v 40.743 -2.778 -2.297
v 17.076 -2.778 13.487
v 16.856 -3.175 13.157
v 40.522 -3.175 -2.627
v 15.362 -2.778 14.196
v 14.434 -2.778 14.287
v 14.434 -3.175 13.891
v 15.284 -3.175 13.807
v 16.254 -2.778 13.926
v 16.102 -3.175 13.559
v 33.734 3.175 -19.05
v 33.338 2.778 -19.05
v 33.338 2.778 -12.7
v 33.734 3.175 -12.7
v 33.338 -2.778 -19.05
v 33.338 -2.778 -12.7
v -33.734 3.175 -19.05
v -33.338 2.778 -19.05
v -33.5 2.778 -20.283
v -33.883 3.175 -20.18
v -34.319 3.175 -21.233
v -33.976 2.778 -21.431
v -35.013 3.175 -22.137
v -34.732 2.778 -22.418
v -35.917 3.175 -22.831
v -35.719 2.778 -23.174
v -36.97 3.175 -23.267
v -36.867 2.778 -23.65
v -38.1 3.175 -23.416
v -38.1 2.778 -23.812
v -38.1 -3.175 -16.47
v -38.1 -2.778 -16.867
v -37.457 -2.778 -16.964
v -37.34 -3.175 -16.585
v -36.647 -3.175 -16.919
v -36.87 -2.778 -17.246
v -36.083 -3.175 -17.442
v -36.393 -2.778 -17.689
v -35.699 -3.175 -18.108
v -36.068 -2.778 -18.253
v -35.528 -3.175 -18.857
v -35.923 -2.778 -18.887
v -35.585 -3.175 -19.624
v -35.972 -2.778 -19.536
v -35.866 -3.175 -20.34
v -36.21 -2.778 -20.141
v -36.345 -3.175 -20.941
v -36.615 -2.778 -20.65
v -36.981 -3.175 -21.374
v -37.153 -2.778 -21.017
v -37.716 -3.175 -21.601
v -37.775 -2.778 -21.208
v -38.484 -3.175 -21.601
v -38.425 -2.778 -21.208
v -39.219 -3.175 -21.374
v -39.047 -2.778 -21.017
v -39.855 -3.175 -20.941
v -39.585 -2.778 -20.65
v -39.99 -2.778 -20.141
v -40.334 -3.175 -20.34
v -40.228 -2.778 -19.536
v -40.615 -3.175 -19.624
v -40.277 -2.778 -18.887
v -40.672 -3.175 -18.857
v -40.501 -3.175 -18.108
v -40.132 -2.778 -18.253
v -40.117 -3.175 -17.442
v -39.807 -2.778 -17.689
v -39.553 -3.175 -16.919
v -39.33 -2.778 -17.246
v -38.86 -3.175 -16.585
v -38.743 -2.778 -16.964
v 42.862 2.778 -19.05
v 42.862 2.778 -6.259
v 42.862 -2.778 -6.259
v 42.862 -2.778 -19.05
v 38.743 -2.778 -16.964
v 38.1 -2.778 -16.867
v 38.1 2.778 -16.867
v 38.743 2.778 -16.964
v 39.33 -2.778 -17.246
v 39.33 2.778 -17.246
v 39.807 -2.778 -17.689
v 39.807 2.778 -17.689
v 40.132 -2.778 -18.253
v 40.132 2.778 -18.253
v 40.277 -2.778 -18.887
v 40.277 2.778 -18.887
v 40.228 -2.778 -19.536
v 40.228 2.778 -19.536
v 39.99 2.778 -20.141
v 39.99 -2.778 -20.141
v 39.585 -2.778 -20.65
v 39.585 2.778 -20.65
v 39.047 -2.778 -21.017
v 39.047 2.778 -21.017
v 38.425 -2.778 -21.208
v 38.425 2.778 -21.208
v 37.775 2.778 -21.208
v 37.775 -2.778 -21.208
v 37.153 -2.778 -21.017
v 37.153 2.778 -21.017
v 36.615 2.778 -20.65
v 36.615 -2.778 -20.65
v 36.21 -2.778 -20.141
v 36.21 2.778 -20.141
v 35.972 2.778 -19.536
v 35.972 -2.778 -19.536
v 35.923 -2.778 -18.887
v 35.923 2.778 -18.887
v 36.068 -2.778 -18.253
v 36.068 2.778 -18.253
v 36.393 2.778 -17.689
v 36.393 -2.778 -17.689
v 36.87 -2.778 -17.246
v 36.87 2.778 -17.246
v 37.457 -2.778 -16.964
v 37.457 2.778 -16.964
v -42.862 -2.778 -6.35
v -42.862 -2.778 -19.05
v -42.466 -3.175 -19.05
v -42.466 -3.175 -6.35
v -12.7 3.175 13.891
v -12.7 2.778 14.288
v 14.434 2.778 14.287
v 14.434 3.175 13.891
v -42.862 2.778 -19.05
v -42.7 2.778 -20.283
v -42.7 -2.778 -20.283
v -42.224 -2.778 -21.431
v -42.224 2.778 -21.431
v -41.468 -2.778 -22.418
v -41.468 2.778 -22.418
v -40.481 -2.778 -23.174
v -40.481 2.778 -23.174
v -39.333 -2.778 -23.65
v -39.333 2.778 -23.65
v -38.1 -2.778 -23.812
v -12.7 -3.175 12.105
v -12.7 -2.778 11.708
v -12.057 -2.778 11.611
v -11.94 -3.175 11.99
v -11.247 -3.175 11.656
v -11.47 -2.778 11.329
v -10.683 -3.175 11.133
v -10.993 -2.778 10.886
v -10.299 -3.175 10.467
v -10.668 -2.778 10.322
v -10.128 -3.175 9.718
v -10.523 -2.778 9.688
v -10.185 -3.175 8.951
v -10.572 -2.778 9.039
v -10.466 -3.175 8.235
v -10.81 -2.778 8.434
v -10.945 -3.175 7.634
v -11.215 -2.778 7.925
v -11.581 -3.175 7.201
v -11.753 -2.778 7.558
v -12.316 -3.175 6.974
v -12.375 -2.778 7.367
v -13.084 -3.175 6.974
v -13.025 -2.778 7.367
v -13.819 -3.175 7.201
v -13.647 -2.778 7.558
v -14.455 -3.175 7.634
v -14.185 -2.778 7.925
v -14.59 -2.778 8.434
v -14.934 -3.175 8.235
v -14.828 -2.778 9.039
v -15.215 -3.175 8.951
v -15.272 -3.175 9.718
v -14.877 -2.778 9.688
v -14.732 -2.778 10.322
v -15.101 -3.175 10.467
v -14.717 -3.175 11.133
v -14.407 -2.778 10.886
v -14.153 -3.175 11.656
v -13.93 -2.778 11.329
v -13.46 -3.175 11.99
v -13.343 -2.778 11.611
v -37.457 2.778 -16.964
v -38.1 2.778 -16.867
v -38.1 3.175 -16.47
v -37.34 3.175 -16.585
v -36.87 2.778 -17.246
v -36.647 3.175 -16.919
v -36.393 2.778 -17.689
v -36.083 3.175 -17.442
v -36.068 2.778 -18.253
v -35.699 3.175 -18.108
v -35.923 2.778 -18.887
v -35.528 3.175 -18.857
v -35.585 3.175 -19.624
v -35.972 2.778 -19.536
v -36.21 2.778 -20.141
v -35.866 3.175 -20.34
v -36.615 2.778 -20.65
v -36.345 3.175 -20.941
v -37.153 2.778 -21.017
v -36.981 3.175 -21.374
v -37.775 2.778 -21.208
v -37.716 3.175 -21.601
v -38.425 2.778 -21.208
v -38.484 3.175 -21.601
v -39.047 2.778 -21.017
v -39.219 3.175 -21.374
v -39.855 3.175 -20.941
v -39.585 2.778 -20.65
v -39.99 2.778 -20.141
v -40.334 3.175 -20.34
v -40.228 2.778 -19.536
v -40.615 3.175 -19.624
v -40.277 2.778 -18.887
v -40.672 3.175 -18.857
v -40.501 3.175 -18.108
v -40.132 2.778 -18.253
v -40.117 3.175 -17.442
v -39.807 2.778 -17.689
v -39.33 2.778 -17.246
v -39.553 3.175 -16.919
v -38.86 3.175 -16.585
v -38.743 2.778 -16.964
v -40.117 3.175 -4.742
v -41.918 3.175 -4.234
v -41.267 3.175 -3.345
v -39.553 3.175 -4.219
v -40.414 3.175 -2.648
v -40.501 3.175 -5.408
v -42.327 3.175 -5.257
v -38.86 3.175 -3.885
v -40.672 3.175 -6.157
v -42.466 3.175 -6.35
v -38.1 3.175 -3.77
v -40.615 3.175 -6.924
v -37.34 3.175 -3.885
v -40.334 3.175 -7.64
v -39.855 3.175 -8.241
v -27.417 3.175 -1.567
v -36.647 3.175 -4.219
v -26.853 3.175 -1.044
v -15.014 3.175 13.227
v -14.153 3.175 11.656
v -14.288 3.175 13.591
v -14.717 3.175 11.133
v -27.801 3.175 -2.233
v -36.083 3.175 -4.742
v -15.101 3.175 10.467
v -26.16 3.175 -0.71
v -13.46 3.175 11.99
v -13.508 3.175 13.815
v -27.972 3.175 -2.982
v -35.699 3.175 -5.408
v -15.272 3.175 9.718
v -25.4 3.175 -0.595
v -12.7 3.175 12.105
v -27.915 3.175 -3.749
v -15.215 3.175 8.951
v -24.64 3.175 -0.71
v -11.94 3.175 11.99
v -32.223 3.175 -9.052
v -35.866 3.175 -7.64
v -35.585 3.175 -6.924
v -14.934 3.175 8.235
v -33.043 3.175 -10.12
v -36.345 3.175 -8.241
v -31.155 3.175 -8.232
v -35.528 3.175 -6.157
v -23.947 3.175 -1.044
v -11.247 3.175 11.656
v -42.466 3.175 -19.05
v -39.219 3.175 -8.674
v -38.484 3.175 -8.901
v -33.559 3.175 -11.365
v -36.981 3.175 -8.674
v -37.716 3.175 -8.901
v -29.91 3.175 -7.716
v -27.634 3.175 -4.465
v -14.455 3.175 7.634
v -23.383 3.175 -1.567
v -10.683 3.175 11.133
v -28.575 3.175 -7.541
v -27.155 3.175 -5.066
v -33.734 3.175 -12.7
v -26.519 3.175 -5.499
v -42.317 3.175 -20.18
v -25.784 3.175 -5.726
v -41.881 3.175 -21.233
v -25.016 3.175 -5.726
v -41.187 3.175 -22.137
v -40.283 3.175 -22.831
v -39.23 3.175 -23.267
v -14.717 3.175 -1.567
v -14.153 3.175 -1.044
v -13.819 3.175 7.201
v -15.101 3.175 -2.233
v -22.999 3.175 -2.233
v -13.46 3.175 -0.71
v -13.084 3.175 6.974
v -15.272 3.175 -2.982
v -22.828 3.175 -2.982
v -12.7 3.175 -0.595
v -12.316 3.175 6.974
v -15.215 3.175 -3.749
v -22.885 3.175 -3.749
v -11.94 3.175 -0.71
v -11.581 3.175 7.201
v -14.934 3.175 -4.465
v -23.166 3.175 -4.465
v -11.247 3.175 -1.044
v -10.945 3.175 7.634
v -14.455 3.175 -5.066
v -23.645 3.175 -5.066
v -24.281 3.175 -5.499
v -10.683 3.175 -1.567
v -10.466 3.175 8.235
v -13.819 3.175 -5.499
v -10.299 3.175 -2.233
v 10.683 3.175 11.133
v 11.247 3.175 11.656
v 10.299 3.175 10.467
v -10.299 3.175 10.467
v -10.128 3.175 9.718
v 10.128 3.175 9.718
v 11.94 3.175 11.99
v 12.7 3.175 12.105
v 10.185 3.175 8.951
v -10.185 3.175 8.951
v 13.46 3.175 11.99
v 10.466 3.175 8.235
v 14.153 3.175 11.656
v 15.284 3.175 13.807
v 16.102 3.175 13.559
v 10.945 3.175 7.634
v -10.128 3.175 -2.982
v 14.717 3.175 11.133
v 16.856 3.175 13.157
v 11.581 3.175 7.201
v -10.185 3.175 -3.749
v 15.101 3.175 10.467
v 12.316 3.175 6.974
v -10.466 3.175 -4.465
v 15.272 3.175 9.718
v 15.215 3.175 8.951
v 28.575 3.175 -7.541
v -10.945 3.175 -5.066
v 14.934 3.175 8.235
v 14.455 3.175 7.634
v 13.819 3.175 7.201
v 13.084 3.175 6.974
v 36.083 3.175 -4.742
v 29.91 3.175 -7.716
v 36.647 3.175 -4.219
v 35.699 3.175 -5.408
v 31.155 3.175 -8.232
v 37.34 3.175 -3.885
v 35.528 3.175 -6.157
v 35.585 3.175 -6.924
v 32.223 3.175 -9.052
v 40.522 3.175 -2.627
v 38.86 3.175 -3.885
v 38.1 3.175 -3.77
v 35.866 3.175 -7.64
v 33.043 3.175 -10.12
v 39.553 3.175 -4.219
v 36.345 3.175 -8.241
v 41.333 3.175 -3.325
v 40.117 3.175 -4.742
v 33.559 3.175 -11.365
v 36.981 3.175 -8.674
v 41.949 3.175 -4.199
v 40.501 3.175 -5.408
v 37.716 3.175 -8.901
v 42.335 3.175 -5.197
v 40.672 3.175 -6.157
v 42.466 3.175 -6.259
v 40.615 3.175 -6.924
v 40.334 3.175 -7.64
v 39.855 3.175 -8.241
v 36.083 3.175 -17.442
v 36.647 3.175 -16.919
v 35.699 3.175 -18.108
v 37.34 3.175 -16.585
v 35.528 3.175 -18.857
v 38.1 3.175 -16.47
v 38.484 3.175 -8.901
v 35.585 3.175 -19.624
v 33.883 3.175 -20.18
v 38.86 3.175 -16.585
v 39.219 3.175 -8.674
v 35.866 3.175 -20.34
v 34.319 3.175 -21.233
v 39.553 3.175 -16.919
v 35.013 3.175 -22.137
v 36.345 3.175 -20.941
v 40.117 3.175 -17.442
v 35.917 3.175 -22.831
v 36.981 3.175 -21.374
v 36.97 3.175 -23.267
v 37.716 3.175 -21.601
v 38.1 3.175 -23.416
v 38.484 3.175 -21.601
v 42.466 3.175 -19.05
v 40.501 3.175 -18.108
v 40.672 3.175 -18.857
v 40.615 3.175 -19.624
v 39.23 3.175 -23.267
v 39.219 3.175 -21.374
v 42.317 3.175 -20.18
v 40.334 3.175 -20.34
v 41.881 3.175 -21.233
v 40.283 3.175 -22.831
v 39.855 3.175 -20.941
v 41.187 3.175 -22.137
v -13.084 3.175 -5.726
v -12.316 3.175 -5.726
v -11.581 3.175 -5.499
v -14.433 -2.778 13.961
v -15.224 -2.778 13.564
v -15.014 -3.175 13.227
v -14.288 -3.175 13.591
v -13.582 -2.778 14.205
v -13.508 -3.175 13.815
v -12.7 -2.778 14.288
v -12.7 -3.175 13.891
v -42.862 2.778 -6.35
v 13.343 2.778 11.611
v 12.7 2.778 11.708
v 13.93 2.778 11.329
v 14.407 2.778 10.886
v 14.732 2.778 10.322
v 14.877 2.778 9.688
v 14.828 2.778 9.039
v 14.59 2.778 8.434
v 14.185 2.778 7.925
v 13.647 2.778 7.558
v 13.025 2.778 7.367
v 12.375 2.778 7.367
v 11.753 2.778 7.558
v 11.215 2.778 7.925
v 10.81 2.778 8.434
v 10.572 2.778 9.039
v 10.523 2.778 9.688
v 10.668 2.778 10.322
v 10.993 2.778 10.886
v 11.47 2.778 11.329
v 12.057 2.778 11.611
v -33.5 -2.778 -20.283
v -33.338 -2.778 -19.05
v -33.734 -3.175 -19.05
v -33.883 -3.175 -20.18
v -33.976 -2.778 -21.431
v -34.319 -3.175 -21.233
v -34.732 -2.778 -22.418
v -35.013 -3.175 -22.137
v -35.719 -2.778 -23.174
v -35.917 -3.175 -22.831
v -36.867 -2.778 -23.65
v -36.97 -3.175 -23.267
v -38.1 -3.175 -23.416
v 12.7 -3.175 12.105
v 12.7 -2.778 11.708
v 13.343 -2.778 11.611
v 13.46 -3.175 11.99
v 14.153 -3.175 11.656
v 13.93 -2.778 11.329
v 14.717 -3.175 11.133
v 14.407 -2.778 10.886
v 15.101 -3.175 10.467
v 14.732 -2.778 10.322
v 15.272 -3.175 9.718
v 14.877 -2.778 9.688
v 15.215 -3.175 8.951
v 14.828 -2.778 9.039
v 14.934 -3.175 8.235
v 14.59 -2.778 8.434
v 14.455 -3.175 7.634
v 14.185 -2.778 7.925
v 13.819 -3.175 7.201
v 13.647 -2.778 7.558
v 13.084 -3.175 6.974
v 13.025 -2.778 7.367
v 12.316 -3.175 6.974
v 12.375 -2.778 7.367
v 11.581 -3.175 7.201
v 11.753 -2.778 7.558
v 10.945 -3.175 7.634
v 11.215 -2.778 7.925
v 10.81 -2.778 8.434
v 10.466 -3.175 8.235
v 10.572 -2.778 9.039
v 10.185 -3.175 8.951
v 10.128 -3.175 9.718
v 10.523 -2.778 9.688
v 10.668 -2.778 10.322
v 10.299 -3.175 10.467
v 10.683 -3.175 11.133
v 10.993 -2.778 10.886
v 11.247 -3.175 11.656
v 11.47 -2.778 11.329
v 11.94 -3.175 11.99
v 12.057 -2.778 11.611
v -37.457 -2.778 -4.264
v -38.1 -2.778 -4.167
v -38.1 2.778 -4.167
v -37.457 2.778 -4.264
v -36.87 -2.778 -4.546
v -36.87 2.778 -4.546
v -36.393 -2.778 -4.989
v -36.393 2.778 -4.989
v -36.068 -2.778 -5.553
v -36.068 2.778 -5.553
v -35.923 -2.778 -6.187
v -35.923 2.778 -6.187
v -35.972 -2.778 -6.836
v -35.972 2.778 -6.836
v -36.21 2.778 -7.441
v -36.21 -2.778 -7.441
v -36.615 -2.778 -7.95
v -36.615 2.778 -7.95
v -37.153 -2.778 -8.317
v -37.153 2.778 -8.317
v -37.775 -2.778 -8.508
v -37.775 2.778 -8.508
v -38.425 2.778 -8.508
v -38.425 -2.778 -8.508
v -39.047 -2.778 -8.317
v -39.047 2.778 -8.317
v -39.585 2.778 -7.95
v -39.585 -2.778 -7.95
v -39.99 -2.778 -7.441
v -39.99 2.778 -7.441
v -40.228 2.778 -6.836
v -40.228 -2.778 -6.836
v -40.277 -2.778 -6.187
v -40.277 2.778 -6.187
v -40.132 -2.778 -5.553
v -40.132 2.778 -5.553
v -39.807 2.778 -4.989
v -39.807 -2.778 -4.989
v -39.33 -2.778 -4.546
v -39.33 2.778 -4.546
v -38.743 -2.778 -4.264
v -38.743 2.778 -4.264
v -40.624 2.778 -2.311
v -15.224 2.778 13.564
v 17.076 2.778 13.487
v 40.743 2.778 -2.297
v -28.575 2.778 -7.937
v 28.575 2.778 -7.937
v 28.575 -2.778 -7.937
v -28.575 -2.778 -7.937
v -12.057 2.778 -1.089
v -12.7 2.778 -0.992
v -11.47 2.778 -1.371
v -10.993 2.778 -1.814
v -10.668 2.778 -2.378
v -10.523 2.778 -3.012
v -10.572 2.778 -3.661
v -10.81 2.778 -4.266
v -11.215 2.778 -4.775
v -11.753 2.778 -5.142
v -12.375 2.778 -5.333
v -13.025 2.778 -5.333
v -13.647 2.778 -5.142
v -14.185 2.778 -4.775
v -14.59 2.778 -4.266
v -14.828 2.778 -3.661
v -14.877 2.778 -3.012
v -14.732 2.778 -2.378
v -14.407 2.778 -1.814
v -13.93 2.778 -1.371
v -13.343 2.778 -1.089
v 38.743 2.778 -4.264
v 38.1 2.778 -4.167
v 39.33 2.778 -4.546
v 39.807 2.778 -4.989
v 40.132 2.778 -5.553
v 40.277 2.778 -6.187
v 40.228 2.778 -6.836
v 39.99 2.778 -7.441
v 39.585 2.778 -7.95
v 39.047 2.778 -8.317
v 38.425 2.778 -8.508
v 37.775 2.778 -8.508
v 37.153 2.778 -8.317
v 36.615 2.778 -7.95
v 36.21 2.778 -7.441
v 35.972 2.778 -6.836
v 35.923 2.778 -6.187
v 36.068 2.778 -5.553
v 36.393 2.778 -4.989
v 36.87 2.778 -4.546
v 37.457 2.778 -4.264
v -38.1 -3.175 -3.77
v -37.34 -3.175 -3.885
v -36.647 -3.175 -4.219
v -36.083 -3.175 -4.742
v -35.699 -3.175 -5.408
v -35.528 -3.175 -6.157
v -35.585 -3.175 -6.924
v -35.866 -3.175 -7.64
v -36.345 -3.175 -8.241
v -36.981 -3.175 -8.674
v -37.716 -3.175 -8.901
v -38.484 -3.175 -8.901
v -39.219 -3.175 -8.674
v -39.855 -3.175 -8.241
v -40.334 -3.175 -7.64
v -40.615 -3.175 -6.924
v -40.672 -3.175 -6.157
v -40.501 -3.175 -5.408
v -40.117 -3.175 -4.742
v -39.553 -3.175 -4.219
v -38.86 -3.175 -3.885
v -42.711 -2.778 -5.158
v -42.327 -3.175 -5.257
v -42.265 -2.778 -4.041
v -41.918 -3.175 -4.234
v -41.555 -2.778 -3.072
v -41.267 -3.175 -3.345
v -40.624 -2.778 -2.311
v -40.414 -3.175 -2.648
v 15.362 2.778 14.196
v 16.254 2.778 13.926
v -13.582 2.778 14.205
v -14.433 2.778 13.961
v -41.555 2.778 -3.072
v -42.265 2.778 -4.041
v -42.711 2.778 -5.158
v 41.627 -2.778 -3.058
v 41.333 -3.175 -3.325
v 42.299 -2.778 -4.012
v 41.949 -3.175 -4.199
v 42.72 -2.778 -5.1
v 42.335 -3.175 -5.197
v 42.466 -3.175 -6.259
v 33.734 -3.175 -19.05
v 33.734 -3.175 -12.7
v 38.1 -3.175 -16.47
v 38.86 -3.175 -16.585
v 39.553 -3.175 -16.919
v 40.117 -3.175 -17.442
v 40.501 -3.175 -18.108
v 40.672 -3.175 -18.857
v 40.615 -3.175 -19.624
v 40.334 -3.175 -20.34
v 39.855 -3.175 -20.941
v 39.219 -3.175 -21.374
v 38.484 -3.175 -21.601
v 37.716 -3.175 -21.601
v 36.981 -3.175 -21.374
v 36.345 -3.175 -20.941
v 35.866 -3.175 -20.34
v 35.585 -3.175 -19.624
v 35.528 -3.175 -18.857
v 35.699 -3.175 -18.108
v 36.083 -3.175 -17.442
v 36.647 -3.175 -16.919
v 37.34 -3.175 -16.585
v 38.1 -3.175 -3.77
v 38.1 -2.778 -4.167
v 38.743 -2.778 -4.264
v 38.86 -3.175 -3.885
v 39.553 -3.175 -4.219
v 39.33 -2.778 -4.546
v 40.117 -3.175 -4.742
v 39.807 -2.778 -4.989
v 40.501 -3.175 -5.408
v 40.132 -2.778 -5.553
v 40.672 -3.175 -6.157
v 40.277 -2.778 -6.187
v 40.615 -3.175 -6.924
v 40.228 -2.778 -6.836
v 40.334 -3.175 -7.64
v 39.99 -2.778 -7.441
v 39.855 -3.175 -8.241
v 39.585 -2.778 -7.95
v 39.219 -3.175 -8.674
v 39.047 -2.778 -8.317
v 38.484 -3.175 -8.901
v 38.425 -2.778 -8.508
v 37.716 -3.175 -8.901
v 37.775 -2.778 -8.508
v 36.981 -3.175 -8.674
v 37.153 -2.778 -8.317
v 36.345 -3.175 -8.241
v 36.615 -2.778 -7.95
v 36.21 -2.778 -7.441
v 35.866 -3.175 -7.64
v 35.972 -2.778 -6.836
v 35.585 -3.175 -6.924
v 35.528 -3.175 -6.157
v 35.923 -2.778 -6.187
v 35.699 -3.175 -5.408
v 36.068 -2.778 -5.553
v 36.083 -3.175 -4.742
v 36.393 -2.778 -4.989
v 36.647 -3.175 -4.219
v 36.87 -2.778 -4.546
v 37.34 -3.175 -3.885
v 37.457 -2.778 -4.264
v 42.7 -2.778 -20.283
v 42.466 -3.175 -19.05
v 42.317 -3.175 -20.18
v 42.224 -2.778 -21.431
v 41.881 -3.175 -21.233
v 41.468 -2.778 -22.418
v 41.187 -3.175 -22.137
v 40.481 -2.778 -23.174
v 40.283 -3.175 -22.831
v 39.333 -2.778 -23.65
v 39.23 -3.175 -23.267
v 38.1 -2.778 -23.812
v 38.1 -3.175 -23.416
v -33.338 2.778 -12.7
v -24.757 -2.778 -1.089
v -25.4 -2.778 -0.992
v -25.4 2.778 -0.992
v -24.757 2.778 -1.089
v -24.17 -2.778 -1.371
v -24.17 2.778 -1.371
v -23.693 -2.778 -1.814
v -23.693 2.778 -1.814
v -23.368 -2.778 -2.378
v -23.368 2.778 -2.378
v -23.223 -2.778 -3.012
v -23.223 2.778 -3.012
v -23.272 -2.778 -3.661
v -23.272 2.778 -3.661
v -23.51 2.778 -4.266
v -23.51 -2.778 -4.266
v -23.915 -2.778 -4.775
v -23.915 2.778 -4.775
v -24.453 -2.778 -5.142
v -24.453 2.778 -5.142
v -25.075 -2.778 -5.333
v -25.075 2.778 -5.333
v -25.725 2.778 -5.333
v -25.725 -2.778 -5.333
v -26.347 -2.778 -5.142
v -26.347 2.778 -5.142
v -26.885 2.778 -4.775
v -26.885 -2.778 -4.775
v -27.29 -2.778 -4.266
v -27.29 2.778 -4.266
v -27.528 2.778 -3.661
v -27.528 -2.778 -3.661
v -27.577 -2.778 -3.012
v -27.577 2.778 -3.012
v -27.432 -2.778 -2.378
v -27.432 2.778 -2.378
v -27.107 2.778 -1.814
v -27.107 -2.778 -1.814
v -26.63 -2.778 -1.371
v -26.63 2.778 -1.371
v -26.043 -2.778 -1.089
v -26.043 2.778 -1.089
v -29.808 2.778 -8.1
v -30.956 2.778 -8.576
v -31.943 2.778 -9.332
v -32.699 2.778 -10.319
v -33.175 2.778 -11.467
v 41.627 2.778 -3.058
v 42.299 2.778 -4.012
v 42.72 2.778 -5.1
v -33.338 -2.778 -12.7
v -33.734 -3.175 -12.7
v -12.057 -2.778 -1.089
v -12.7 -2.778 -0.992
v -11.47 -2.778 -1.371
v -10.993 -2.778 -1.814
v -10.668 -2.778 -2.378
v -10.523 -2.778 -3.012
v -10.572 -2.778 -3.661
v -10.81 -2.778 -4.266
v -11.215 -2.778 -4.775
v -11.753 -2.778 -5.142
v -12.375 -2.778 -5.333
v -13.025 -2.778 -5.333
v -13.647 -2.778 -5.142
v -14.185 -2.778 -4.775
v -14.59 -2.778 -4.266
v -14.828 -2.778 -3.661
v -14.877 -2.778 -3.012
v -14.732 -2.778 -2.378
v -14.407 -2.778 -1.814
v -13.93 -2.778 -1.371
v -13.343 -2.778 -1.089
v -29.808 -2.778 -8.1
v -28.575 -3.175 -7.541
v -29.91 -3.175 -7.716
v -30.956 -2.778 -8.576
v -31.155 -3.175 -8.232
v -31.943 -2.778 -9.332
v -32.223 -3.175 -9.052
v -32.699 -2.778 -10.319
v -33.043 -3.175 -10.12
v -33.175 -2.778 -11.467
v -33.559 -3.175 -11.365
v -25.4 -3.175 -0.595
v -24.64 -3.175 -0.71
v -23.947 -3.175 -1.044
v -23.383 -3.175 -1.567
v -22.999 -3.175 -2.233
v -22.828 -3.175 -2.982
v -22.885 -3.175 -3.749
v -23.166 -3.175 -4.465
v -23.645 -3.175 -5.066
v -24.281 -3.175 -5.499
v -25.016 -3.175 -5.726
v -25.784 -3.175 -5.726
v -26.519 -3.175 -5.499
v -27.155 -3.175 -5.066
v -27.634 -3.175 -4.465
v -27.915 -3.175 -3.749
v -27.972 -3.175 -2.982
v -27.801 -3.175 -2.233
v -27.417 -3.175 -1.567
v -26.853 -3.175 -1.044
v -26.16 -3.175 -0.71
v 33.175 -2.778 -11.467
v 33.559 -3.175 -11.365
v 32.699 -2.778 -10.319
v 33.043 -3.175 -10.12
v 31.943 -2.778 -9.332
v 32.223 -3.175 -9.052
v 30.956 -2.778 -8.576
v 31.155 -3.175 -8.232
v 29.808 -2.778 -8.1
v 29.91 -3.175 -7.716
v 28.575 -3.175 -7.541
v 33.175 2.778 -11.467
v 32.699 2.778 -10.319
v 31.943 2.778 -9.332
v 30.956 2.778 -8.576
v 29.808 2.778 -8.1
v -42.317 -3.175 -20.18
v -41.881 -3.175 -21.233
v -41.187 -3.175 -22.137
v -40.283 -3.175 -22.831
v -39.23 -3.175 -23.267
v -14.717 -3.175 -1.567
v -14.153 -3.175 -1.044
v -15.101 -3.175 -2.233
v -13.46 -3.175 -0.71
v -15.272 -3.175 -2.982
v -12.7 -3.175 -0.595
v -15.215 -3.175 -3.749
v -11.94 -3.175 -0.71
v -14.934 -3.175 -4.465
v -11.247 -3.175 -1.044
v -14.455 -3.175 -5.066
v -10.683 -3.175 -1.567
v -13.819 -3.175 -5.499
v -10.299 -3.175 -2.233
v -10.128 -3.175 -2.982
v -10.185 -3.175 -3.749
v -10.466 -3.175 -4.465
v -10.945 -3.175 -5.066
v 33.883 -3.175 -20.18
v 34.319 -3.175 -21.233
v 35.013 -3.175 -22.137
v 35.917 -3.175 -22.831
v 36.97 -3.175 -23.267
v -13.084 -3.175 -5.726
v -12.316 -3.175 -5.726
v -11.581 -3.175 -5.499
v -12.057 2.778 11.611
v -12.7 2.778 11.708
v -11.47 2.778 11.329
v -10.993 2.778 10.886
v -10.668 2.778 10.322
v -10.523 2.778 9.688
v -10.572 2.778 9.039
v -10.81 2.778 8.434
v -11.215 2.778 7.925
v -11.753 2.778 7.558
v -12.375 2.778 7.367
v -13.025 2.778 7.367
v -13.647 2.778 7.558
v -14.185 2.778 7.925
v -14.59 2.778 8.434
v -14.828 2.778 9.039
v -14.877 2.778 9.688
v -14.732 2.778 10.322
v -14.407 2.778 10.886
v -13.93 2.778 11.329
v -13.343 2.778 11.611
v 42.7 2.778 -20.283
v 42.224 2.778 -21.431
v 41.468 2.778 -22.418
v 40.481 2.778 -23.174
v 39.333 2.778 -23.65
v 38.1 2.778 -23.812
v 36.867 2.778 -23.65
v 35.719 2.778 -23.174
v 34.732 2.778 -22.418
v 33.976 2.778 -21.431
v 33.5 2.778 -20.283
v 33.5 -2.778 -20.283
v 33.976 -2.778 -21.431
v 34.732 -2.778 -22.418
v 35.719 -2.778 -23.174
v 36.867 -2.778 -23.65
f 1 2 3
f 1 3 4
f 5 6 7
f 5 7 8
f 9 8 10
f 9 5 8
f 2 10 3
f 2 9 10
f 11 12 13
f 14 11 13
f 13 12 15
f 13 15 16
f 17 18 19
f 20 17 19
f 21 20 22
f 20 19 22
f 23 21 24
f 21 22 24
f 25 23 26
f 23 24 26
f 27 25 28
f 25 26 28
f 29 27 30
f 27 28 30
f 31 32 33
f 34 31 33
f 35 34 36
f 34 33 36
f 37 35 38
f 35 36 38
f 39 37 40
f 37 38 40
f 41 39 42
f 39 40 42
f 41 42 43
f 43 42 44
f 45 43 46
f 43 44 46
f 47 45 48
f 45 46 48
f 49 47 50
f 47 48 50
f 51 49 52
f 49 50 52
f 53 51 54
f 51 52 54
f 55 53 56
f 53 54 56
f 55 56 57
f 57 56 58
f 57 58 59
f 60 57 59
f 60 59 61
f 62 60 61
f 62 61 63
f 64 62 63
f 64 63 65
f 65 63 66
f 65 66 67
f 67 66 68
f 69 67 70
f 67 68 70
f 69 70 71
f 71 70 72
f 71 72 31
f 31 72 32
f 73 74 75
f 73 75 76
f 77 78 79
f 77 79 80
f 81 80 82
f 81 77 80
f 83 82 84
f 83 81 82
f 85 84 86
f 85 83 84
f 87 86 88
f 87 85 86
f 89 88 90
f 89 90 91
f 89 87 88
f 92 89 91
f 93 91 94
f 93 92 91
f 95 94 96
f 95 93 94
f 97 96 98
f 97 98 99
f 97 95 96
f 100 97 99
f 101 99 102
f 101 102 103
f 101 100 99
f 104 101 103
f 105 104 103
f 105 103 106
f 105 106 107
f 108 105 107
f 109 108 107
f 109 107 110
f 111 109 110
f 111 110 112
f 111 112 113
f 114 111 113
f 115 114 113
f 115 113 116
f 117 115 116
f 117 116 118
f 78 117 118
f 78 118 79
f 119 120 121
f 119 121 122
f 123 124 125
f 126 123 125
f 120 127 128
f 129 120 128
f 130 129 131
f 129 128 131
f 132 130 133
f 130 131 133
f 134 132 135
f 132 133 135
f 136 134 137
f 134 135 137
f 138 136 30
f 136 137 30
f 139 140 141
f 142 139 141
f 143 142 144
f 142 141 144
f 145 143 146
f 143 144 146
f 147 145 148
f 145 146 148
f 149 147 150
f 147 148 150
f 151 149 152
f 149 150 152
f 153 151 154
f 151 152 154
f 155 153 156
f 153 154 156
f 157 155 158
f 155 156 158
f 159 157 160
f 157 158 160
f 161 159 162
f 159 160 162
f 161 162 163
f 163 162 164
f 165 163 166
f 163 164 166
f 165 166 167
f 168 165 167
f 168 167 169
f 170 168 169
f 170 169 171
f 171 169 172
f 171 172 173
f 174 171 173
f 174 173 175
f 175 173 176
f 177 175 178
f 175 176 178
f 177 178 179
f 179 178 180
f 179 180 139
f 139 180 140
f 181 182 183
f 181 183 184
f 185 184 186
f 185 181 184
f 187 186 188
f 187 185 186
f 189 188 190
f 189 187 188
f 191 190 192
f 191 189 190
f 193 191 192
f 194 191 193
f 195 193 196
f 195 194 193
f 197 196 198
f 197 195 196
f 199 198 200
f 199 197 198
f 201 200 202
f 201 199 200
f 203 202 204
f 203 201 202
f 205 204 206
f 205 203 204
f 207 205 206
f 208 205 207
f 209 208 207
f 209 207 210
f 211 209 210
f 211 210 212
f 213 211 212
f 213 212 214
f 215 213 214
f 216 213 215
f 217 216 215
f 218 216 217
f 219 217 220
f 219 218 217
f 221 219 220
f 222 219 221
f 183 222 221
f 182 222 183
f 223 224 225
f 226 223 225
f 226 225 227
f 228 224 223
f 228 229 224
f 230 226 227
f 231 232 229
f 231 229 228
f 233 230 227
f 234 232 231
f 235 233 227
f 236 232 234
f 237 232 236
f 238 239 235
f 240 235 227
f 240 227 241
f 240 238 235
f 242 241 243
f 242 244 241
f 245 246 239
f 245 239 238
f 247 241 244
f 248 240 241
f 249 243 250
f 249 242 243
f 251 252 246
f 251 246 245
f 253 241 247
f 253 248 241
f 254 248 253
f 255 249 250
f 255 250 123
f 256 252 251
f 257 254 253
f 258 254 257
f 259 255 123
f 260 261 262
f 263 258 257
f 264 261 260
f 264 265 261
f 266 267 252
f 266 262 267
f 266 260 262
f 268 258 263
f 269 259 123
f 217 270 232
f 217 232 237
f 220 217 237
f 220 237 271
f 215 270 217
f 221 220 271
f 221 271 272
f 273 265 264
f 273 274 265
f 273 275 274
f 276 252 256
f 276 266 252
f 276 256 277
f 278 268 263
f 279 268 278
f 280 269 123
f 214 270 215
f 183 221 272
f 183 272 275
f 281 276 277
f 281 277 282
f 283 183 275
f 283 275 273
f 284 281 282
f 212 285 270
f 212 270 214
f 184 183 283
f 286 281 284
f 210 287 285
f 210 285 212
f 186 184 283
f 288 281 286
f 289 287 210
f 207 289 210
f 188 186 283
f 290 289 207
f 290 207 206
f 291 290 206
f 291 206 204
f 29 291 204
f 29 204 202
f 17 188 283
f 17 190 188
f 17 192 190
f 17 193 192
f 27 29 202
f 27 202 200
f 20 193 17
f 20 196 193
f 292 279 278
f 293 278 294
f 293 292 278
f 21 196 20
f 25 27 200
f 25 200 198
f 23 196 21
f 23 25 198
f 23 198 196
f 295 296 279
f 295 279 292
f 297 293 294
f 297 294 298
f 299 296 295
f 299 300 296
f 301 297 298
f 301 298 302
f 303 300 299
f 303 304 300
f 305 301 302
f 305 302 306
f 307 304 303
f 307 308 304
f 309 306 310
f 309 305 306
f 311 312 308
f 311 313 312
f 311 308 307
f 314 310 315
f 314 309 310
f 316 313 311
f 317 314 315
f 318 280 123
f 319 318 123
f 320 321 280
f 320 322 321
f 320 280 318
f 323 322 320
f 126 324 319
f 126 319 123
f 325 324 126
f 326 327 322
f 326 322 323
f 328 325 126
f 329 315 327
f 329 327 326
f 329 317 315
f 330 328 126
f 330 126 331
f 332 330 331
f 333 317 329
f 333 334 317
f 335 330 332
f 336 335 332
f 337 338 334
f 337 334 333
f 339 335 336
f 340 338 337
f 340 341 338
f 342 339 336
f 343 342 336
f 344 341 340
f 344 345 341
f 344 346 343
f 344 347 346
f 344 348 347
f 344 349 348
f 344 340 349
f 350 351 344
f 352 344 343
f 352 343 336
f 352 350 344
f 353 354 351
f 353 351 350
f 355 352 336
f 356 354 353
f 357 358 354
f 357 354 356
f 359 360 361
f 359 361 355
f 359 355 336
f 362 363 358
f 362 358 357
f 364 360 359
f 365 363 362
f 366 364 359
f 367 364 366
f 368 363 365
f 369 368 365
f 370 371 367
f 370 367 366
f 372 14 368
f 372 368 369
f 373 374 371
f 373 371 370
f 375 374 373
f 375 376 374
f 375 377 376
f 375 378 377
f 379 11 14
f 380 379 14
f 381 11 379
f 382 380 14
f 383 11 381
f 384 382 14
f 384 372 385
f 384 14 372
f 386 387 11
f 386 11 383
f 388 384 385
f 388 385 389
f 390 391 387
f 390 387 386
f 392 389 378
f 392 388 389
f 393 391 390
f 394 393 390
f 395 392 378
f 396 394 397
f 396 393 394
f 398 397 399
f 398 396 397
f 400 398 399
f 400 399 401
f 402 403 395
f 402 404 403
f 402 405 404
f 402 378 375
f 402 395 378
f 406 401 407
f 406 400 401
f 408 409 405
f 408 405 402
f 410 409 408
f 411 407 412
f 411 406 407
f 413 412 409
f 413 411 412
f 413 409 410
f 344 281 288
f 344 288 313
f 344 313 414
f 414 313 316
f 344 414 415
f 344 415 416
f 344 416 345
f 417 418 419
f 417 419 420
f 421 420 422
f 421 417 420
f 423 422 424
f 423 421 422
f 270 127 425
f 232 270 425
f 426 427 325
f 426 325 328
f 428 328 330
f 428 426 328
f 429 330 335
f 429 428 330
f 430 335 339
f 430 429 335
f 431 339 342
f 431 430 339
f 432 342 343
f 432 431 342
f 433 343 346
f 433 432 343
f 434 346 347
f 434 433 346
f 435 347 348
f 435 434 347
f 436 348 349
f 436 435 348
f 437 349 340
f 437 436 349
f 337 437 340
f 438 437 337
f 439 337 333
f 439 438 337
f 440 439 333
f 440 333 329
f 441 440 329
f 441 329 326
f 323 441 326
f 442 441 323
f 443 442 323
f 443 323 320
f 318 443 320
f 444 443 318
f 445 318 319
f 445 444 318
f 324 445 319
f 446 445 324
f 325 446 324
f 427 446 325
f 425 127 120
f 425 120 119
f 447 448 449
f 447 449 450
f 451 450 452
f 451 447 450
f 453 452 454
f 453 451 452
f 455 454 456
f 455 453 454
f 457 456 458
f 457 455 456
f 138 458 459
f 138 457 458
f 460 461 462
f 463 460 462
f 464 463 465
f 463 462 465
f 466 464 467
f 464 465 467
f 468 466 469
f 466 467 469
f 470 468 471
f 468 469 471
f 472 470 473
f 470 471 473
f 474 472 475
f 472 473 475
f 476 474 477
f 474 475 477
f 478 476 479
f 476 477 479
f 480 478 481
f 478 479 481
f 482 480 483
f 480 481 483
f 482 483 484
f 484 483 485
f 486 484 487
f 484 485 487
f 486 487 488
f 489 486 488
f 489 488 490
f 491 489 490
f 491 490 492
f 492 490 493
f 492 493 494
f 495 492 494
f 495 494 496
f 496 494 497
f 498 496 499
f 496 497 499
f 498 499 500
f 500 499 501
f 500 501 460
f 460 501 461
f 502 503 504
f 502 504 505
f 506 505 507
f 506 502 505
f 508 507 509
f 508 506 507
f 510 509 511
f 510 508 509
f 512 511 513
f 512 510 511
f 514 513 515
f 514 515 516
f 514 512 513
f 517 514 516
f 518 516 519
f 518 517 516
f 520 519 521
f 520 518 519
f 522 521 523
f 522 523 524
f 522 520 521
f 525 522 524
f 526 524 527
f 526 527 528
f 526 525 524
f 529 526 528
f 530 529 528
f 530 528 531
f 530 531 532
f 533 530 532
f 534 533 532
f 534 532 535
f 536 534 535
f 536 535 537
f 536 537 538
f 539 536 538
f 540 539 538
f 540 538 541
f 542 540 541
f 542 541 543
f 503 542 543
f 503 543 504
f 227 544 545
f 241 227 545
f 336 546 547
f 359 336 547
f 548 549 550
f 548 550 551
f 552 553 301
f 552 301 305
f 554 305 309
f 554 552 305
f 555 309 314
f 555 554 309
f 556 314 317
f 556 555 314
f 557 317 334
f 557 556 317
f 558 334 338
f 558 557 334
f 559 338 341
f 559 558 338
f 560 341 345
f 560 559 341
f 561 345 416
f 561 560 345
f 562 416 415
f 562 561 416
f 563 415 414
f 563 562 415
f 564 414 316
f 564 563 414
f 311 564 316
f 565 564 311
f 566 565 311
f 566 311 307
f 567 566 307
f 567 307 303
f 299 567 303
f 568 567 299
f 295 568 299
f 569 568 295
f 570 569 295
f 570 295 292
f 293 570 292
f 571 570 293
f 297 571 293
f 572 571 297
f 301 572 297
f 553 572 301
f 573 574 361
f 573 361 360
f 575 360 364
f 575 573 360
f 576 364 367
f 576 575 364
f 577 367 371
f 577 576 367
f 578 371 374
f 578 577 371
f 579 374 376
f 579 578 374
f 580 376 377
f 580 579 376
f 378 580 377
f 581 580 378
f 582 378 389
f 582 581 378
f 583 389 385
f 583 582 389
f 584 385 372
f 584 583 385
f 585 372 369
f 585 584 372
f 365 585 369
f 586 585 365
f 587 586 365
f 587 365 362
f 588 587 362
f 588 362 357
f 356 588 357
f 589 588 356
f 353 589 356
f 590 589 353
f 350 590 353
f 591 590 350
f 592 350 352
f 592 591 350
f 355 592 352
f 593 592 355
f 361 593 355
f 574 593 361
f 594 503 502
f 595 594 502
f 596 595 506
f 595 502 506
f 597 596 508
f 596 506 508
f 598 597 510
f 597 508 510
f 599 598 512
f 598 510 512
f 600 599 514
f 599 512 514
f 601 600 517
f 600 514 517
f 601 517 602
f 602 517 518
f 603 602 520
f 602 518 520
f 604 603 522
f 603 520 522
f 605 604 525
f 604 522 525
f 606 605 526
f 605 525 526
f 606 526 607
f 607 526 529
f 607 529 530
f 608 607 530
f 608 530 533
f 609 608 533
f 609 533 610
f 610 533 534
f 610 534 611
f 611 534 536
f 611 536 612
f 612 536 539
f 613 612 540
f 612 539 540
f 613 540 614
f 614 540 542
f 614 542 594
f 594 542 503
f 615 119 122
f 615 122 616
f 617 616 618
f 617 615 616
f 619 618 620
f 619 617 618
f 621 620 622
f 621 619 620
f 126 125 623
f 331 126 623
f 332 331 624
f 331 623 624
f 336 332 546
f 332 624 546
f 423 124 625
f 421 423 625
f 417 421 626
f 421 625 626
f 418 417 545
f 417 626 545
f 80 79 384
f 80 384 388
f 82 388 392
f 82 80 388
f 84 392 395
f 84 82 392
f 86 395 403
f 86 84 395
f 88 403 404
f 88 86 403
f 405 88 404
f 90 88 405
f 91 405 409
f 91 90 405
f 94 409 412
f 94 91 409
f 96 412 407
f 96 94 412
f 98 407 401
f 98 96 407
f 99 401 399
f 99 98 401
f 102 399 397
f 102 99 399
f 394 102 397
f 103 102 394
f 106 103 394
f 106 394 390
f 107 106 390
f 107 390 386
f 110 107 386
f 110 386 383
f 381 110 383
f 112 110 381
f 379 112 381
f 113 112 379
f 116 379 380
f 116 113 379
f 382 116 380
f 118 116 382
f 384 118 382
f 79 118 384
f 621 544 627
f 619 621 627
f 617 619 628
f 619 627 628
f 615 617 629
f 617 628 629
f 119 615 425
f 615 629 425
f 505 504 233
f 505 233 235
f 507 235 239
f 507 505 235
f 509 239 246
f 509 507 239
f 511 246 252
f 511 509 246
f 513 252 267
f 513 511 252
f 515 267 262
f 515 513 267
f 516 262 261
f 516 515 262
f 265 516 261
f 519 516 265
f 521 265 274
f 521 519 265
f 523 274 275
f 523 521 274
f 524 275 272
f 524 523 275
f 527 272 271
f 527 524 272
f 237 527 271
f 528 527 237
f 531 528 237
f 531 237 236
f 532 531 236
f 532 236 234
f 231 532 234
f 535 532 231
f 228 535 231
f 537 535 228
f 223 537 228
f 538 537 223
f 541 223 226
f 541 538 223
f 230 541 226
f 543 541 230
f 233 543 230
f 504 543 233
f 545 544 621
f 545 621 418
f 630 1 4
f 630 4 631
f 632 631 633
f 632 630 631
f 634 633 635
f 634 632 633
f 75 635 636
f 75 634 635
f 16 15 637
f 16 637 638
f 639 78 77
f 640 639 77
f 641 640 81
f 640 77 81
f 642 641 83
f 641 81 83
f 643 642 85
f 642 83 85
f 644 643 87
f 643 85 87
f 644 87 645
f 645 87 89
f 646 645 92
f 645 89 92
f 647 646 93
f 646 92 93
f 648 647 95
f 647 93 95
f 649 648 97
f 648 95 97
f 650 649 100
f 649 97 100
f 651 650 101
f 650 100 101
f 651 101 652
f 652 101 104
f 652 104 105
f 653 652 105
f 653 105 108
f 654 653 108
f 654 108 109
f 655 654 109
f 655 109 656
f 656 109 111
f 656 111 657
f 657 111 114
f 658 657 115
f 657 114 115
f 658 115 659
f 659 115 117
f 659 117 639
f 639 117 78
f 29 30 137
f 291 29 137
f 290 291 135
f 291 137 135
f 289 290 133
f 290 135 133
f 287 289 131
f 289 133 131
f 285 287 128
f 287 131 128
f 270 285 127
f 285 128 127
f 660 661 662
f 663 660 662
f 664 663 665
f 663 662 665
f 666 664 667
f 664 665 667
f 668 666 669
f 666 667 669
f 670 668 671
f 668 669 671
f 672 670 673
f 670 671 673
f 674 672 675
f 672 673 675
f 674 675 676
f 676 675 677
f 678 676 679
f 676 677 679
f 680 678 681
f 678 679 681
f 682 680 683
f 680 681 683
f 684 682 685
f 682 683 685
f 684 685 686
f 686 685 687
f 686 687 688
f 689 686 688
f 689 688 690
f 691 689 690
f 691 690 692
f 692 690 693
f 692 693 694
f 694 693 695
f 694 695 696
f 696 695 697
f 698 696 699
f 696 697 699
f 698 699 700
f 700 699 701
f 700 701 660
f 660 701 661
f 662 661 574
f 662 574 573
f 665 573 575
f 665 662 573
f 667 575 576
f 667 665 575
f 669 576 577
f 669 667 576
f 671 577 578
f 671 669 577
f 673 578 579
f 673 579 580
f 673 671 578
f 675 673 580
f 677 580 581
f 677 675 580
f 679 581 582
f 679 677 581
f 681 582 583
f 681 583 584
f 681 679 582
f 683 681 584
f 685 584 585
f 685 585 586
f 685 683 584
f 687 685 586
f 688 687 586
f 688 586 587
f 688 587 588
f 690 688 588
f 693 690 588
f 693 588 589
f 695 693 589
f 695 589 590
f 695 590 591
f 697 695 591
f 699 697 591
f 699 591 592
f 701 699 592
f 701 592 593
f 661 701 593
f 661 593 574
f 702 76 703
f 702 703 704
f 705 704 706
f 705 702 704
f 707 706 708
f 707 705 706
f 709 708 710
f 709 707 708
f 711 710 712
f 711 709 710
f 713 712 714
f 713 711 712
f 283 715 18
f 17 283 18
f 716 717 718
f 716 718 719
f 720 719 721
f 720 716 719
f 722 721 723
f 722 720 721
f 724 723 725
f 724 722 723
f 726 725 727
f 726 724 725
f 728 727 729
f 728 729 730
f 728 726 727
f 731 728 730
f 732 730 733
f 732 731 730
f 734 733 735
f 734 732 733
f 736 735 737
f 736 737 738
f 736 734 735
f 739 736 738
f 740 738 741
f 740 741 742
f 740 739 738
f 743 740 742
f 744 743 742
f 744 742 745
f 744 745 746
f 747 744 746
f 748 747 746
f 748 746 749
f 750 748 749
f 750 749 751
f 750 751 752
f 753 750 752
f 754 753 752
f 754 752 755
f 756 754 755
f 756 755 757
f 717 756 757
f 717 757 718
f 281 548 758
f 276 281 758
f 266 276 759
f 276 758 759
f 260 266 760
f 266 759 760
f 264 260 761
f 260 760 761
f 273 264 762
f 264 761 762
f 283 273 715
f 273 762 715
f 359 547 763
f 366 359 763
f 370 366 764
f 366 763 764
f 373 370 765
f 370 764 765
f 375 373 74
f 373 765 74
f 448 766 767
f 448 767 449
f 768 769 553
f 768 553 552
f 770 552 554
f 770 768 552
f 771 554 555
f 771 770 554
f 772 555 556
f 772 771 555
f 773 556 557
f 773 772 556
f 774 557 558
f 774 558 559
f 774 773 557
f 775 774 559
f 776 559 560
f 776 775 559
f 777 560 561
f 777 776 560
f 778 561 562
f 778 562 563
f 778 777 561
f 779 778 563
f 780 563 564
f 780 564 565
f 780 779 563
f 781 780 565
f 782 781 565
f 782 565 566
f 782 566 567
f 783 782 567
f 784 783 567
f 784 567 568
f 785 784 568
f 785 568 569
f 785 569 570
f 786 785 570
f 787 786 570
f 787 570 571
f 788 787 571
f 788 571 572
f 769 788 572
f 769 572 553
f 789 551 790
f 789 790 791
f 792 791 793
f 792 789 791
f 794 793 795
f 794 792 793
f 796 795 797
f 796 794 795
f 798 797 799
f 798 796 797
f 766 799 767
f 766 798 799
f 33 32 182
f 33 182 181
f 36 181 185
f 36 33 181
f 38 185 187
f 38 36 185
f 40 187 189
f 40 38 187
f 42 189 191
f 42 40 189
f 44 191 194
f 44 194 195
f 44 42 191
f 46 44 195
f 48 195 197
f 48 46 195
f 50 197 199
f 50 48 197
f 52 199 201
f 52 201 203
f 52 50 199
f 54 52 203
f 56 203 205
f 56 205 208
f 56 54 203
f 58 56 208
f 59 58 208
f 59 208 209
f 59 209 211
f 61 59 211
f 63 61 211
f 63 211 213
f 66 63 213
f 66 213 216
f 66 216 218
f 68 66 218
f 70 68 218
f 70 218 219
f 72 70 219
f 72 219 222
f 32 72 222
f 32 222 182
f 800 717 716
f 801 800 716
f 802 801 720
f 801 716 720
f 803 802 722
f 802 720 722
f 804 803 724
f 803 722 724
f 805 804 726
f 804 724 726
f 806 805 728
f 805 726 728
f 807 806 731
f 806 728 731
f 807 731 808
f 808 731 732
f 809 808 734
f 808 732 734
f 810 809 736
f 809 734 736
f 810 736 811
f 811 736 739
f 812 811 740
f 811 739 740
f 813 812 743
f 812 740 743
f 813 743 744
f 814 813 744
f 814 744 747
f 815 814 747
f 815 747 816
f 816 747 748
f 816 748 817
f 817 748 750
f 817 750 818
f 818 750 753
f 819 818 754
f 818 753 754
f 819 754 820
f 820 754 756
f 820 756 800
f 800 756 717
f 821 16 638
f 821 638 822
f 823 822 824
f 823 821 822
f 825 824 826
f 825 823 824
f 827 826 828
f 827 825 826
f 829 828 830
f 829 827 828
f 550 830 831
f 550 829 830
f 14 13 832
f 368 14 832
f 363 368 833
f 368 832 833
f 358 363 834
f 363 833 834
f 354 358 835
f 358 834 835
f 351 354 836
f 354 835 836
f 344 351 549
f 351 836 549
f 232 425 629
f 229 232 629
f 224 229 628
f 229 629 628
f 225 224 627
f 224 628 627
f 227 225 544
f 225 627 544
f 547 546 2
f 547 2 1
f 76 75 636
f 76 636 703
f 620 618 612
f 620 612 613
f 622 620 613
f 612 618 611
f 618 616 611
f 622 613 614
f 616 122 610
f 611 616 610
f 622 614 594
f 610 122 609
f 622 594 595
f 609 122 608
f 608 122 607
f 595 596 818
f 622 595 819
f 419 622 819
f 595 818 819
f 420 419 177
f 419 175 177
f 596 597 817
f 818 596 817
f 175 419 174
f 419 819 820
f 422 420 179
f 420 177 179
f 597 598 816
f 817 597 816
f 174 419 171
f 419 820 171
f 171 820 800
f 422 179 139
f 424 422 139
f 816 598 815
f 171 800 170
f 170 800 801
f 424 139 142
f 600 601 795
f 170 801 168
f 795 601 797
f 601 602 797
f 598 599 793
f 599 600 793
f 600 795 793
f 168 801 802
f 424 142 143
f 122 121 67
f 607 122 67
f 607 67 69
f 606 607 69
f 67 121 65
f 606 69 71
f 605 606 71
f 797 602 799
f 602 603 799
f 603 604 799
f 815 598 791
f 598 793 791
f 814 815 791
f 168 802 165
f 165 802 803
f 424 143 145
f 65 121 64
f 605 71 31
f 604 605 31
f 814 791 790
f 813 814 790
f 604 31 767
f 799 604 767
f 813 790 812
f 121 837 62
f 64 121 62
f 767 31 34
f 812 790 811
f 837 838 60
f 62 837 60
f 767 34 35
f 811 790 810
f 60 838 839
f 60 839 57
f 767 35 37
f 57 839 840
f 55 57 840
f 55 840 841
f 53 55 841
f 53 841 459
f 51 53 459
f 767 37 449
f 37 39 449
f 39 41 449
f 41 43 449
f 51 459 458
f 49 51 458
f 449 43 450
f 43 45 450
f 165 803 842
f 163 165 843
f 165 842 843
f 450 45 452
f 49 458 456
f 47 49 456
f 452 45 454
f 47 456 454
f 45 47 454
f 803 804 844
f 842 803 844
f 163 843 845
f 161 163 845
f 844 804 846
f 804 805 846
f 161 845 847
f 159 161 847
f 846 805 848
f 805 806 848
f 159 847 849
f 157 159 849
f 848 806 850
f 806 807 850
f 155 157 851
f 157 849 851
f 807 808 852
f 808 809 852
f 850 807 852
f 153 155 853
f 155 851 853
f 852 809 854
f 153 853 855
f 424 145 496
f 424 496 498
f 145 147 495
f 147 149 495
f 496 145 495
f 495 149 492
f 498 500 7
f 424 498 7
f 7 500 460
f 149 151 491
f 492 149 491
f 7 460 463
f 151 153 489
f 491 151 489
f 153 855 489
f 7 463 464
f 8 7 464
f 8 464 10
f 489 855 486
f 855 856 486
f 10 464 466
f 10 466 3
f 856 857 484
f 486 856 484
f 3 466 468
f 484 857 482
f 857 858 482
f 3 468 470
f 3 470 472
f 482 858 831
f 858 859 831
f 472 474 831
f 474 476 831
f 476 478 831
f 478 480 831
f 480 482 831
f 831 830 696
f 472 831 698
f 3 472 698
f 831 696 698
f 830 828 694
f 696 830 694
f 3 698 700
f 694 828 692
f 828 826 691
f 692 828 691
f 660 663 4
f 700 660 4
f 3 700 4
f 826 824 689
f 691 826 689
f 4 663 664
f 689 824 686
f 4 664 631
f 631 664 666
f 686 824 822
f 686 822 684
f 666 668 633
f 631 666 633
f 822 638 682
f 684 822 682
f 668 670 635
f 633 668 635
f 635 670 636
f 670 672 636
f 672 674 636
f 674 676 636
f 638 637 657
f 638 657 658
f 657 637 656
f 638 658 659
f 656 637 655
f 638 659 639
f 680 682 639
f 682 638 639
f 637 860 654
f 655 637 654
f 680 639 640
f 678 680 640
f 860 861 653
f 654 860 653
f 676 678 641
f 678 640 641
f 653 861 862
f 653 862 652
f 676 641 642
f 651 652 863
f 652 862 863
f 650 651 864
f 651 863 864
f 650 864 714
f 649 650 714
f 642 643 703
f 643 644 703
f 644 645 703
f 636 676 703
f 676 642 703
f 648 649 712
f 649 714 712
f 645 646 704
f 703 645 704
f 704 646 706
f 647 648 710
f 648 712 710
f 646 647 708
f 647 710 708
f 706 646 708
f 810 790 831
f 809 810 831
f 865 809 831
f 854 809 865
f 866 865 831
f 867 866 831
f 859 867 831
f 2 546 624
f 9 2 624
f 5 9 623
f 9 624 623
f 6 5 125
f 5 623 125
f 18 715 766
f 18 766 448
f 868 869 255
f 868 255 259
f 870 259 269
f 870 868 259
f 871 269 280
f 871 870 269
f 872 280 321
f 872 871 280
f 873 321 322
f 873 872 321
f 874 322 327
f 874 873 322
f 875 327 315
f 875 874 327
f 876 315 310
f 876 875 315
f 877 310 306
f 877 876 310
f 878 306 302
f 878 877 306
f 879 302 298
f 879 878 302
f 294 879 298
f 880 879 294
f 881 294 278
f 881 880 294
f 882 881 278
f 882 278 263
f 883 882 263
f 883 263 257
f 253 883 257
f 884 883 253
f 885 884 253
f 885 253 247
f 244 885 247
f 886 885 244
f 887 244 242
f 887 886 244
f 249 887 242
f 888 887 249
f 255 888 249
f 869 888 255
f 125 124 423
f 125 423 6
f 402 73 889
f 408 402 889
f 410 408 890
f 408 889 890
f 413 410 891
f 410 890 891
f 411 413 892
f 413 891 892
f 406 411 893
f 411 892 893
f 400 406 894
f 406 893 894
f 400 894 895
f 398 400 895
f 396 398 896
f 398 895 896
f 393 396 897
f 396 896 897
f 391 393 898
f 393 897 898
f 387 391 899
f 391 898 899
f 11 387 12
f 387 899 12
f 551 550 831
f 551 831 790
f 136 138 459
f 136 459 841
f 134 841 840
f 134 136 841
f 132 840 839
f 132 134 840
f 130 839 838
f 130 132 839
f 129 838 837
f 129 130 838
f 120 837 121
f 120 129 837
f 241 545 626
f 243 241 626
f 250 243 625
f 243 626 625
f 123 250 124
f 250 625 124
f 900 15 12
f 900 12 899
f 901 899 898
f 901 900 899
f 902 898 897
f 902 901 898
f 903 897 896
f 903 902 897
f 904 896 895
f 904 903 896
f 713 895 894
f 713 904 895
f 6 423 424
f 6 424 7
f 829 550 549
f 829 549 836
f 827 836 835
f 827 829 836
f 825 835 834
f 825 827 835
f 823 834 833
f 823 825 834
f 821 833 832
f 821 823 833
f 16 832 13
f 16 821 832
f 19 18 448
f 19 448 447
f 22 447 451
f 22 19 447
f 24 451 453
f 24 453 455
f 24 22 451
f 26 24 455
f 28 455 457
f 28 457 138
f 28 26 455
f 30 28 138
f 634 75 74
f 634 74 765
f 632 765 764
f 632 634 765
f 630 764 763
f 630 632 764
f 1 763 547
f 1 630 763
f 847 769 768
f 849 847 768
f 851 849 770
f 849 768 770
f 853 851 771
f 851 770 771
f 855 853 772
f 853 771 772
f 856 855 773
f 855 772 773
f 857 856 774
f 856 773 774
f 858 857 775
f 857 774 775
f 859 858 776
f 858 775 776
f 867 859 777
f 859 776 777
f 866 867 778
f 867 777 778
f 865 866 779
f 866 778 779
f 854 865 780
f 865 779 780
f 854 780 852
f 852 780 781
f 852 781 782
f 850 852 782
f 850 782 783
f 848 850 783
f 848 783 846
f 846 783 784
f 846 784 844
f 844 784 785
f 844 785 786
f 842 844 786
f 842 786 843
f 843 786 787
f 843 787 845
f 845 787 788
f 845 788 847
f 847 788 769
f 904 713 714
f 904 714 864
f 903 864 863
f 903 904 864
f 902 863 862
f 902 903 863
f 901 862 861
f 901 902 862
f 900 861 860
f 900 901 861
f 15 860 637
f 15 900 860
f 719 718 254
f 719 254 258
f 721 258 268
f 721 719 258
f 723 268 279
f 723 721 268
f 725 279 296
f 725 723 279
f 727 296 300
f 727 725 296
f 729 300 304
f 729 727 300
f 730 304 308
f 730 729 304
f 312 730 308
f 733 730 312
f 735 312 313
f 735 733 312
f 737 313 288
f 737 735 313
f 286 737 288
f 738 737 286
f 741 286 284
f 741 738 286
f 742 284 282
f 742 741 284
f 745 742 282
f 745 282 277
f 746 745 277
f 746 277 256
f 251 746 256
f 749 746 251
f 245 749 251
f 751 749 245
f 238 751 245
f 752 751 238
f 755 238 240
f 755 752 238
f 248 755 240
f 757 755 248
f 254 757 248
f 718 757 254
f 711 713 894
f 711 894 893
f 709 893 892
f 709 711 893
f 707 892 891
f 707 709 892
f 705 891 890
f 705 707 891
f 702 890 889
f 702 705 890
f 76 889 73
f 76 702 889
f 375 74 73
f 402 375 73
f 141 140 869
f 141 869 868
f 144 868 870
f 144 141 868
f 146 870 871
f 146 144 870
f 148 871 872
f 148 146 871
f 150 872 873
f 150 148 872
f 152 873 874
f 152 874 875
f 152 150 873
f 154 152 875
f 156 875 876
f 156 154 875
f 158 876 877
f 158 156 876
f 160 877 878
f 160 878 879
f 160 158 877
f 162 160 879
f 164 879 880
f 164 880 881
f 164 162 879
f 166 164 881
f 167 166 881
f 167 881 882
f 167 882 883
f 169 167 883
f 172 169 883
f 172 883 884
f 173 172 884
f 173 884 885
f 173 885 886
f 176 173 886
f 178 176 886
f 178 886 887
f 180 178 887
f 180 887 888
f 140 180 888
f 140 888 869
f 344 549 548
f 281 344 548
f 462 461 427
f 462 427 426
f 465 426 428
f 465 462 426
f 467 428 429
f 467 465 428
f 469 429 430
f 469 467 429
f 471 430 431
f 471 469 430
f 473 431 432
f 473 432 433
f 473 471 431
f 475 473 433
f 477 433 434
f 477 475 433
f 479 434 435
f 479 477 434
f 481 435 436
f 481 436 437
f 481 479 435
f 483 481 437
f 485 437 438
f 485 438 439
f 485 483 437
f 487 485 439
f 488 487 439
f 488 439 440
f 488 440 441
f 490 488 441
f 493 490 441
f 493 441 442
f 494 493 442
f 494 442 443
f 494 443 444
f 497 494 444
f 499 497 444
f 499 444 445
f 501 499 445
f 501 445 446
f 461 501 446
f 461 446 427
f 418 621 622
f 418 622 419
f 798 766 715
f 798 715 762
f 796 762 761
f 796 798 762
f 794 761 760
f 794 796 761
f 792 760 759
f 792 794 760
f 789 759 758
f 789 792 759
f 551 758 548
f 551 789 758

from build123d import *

# Parameters (mm, degrees)
SKETCH1_R           = 2.1828125
BOSS_EXTRUDE1_DEPTH = 3.175
FILLET1_R           = 4.7625
CHAMFER1_SIZE       = 0.396875


with BuildPart() as part:
    # Sketch1 → Boss-Extrude1 (new, symmetric)
    with BuildSketch(Plane(origin=(0, 0, 0), x_dir=(1, 0, 0), z_dir=(0, 1, 0))):
        Polygon((-33.3375, 7.9375), (-33.3375, 23.8125), (-42.8625, 23.8125), (-42.8625, 3.710395607), (-14.065867028, -14.2875), (15.876245853, -14.2875), (42.8625, 3.710395607), (42.8625, 23.8125), (33.3375, 23.8125), (33.3375, 7.9375), align=None)
        with Locations(Location((-38.1, 6.35, 0), (0, 0, 270))):
            Circle(SKETCH1_R, mode=Mode.SUBTRACT)
        with Locations(Location((-38.1, 19.05, 0), (0, 0, 270))):
            Circle(SKETCH1_R, mode=Mode.SUBTRACT)
        with Locations(Location((38.1, 19.05, 0), (0, 0, 270))):
            Circle(SKETCH1_R, mode=Mode.SUBTRACT)
        with Locations(Location((38.1, 6.35, 0), (0, 0, 270))):
            Circle(SKETCH1_R, mode=Mode.SUBTRACT)
        with Locations(Location((-25.4, 3.175, 0), (0, 0, 270))):
            Circle(SKETCH1_R, mode=Mode.SUBTRACT)
        with Locations(Location((-12.7, 3.175, 0), (0, 0, 270))):
            Circle(SKETCH1_R, mode=Mode.SUBTRACT)
        with Locations(Location((-12.7, -9.525, 0), (0, 0, 270))):
            Circle(SKETCH1_R, mode=Mode.SUBTRACT)
        with Locations(Location((12.7, -9.525, 0), (0, 0, 270))):
            Circle(SKETCH1_R, mode=Mode.SUBTRACT)
    extrude(amount=BOSS_EXTRUDE1_DEPTH, both=True)

    # Fillet1
    fillet1_edges = [part.edges().sort_by_distance(p)[0] for p in [
        (42.8625, 0, -3.710395607),
        (15.876245853, 0, 14.2875),
        (-14.065867028, 0, 14.2875),
        (-42.8625, 0, -3.710395607),
        (-33.3375, 0, -23.8125),
        (-42.8625, 0, -23.8125),
        (42.8625, 0, -23.8125),
        (33.3375, 0, -23.8125),
        (33.3375, 0, -7.9375),
        (-33.3375, 0, -7.9375),
    ]]
    fillet(fillet1_edges, radius=FILLET1_R - 0.0001)  # a hair under: the kernel refuses the full size

    # Chamfer1
    chamfer1_edges = [part.edges().sort_by_distance(p)[0] for p in [
        (-38.1, -3.175, -8.5328125),
        (-38.1, 3.175, -8.5328125),
        (-38.1, -3.175, -21.2328125),
        (-38.1, 3.175, -21.2328125),
        (38.1, -3.175, -21.2328125),
        (38.1, 3.175, -21.2328125),
        (38.1, -3.175, -8.5328125),
        (38.1, 3.175, -8.5328125),
        (-12.7, -3.175, -5.3578125),
        (-12.7, 3.175, -5.3578125),
        (-25.4, -3.175, -5.3578125),
        (-25.4, 3.175, -5.3578125),
        (12.7, -3.175, 7.3421875),
        (12.7, 3.175, 7.3421875),
        (-12.7, -3.175, 7.3421875),
        (-12.7, 3.175, 7.3421875),
        (42.8625, -3.175, -12.654350033),
        (42.8625, 3.175, -12.654350033),
        (28.909389934, -3.175, 5.595327855),
        (0.866903869, -3.175, 14.2875),
        (-27.924131292, -3.175, 5.626084835),
        (-42.8625, -3.175, -12.700022288),
        (-33.3375, -3.175, -15.875),
        (0, -3.175, -7.9375),
        (33.3375, -3.175, -15.875),
        (34.732374665, -3.175, -22.417625335),
        (41.467625335, -3.175, -22.417625335),
        (-41.467625335, -3.175, -22.417625335),
        (-34.732374665, -3.175, -22.417625335),
        (-42.265497353, -3.175, -4.041282917),
        (-14.01293908, -3.175, 14.102951029),
        (15.814317137, -3.175, 14.083030095),
        (42.299190555, -3.175, -4.011804065),
        (28.909389934, 3.175, 5.595327855),
        (33.3375, 3.175, -15.875),
        (0, 3.175, -7.9375),
        (-33.3375, 3.175, -15.875),
        (-42.8625, 3.175, -12.700022288),
        (-27.924131292, 3.175, 5.626084835),
        (0.866903869, 3.175, 14.2875),
        (34.732374665, 3.175, -22.417625335),
        (41.467625335, 3.175, -22.417625335),
        (-41.467625335, 3.175, -22.417625335),
        (-34.732374665, 3.175, -22.417625335),
        (-42.265497353, 3.175, -4.041282917),
        (-14.01293908, 3.175, 14.102951029),
        (15.814317137, 3.175, 14.083030095),
        (42.299190555, 3.175, -4.011804065),
        (31.942625335, -3.175, -9.332374665),
        (31.942625335, 3.175, -9.332374665),
        (-31.942625335, -3.175, -9.332374665),
        (-31.942625335, 3.175, -9.332374665),
    ]]
    chamfer(chamfer1_edges, length=CHAMFER1_SIZE)


solid = part.part
